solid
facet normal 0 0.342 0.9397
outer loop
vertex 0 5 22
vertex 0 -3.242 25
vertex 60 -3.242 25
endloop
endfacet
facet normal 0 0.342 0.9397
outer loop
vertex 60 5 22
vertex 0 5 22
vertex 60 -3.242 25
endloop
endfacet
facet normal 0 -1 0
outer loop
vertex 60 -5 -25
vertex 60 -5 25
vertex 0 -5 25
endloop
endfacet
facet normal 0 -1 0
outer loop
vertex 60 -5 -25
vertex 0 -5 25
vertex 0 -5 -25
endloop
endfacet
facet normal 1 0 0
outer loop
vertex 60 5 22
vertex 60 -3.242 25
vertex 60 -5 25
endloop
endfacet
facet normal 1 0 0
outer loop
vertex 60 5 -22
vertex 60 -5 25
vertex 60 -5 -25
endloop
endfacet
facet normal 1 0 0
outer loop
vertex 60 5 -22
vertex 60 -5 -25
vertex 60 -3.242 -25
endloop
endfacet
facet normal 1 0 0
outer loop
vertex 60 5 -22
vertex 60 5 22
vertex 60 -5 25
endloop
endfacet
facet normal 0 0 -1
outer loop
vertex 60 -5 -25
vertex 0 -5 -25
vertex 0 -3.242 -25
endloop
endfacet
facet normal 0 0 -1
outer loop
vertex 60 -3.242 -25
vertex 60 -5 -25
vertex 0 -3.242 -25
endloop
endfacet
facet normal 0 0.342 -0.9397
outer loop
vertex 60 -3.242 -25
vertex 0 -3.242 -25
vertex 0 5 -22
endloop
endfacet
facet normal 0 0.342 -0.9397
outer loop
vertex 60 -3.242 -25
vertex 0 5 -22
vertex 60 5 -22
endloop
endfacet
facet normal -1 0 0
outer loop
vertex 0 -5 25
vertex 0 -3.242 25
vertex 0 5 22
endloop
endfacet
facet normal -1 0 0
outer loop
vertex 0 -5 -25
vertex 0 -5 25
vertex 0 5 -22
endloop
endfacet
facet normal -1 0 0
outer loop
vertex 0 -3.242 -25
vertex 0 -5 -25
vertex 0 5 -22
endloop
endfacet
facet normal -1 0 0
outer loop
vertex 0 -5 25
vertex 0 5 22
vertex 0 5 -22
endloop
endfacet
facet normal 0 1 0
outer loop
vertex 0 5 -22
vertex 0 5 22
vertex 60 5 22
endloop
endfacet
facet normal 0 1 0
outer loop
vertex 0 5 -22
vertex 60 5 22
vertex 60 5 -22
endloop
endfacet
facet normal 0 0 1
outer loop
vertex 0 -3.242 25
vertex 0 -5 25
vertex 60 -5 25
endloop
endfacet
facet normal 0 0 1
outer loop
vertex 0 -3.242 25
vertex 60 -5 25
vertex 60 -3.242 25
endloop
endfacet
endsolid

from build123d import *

# Parameters (mm, degrees)
SKETCH1_W           = 50
SKETCH1_H           = 10
BOSS_EXTRUDE1_DEPTH = 60
CHAMFER1_SIZE       = 3
CHAMFER1_SIZE2      = 8.242432258
CHAMFER2_SIZE       = 3
CHAMFER2_SIZE2      = 8.242432258


with BuildPart() as part:
    # Sketch1 → Boss-Extrude1 (new body)
    with BuildSketch(Plane(origin=(0, 0, 0), x_dir=(0, 0, -1), z_dir=(1, 0, 0))):
        Rectangle(SKETCH1_W, SKETCH1_H)
    extrude(amount=BOSS_EXTRUDE1_DEPTH)

    # Chamfer1
    chamfer1_edges = [part.edges().sort_by_distance(p)[0] for p in [
        (30, 5, 25),
    ]]
    chamfer1_side = [part.faces().sort_by_distance(p)[0] for p in [
        (30, 5, 0),
    ]]
    chamfer(chamfer1_edges, length=CHAMFER1_SIZE, length2=CHAMFER1_SIZE2, reference=chamfer1_side[0])

    # Chamfer2
    chamfer2_edges = [part.edges().sort_by_distance(p)[0] for p in [
        (30, 5, -25),
    ]]
    chamfer2_side = [part.faces().sort_by_distance(p)[0] for p in [
        (30, 5, -1.5),
    ]]
    chamfer(chamfer2_edges, length=CHAMFER2_SIZE, length2=CHAMFER2_SIZE2, reference=chamfer2_side[0])


solid = part.part
